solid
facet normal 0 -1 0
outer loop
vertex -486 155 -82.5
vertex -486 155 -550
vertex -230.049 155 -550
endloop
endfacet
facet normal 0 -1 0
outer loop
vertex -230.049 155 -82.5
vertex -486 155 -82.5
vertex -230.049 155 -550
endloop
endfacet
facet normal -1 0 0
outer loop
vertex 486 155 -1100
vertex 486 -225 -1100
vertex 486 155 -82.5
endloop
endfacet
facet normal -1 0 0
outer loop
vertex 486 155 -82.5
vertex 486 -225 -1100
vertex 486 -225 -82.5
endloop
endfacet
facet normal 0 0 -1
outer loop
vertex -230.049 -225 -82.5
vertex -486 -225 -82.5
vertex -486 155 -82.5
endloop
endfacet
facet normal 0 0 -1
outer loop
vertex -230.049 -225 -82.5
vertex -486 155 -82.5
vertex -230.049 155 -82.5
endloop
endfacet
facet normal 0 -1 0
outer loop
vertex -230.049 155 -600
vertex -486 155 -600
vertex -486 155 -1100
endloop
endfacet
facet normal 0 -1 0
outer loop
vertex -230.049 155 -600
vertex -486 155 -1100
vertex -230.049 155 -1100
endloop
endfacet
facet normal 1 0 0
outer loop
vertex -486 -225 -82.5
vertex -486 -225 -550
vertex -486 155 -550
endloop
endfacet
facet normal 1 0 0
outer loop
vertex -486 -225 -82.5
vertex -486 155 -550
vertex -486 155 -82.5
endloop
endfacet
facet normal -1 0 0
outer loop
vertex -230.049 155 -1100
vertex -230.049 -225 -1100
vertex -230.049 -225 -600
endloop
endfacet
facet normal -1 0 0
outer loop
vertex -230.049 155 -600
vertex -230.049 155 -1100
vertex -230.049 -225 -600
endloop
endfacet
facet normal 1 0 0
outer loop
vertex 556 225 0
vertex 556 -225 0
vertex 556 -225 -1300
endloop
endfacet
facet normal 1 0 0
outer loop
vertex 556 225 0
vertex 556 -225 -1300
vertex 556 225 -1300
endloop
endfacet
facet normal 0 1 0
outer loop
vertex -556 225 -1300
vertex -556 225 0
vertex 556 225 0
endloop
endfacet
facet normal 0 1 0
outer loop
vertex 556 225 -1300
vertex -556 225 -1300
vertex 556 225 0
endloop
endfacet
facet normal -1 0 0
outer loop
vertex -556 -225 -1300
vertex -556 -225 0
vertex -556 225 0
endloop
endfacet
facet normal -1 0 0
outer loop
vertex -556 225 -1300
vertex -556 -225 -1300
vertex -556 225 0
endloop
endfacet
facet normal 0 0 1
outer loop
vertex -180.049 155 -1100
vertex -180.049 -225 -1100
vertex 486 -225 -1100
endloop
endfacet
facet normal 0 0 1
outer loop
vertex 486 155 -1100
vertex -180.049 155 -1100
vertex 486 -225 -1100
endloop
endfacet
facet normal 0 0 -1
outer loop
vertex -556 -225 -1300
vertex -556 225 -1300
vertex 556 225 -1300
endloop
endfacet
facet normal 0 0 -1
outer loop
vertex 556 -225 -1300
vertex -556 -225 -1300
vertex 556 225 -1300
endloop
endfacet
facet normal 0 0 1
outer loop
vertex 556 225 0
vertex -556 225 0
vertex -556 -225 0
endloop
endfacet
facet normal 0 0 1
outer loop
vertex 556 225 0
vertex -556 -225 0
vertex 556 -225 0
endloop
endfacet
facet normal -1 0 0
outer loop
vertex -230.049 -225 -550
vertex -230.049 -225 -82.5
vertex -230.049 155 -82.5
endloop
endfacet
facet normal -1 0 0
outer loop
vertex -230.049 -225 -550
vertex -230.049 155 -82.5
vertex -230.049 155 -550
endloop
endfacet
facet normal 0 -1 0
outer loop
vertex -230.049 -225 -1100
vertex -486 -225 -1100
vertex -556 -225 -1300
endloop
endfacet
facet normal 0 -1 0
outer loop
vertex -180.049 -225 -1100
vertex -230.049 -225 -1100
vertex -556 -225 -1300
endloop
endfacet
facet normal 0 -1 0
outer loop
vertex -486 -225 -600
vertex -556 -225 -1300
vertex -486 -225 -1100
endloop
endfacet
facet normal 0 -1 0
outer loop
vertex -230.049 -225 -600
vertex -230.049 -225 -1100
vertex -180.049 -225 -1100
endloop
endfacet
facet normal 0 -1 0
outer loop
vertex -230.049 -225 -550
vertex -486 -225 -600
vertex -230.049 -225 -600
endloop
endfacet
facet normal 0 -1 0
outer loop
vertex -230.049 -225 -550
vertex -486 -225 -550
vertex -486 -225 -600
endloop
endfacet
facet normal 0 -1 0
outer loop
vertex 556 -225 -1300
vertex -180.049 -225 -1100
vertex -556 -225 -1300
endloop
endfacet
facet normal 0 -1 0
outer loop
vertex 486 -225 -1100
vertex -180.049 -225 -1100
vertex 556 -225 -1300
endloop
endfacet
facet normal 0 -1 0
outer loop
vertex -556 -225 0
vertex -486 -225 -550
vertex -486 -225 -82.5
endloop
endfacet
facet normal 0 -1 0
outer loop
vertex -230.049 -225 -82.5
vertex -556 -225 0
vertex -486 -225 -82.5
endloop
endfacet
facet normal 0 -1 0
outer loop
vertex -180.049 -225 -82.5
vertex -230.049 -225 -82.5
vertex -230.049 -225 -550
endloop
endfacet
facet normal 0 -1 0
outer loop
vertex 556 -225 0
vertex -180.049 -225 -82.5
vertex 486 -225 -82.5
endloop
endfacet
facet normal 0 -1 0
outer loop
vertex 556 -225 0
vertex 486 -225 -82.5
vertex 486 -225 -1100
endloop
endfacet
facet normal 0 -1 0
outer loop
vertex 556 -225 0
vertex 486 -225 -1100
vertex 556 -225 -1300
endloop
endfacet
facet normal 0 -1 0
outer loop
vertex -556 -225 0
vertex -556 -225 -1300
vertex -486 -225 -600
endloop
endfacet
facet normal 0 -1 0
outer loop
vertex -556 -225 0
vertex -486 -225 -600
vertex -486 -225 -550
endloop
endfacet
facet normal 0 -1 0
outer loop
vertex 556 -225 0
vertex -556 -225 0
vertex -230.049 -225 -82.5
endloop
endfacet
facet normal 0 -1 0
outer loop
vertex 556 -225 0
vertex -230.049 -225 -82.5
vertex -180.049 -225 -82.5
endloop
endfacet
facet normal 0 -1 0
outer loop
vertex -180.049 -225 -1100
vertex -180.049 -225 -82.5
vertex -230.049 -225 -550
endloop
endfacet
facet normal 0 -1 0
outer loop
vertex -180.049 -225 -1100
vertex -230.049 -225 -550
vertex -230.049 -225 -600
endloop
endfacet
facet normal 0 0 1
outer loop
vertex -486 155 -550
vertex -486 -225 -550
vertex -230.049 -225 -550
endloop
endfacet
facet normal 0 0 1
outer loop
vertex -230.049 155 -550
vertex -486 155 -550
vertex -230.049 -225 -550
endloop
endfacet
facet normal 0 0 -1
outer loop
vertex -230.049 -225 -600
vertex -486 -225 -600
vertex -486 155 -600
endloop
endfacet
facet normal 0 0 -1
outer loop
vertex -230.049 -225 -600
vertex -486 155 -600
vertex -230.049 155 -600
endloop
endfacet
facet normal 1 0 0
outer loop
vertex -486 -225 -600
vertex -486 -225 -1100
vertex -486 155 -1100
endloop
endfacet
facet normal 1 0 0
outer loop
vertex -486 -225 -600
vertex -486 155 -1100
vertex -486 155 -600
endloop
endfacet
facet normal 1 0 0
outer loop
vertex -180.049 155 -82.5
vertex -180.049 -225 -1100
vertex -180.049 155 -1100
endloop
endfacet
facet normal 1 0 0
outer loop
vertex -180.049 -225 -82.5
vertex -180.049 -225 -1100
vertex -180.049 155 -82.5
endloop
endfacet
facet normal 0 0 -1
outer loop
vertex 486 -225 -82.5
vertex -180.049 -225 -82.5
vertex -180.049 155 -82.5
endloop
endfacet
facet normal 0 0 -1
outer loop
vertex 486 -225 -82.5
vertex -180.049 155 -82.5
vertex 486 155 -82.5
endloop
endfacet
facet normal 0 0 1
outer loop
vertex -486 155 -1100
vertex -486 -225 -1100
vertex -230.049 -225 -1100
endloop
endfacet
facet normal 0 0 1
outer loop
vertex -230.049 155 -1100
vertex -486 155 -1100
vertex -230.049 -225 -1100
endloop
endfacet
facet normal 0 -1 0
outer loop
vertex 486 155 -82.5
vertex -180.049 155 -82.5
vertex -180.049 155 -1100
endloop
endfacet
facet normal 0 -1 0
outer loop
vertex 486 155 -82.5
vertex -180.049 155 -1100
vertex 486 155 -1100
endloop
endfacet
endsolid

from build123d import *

# Parameters (mm, degrees)
F0_W     = 1112
F0_H     = 450
F1_DEPTH = 1300
F2_W     = 972
F2_H     = 1017.5
F3_DEPTH = 380
F4_W     = 50
F4_H     = 467.5
F4_H_2   = 50
F4_W_2   = 255.950524
F4_H_3   = 500
F5_DEPTH = 380


with BuildPart() as f1:
    # F0 (on Top) → F1 (new body)
    with BuildSketch(Plane.XY):
        Rectangle(F0_W, F0_H)
    extrude(amount=-F1_DEPTH)

    # F2 (on face) → F3 (cut)
    with BuildSketch(Plane.XZ.offset(225)):
        with Locations((0, -591.25)):
            Rectangle(F2_W, F2_H)
    extrude(amount=-F3_DEPTH, mode=Mode.SUBTRACT)

    # F4 (on face) → F5 (join)
    with BuildSketch(Plane.XZ.offset(225)):
        with Locations((-205.049476, -316.25)):
            Rectangle(F4_W, F4_H)
        with Locations((-205.049476, -575)):
            Rectangle(F4_W, F4_H_2)
        with Locations((-358.024738, -575)):
            Rectangle(F4_W_2, F4_H_2)
        with Locations((-205.049476, -850)):
            Rectangle(F4_W, F4_H_3)
    extrude(amount=-F5_DEPTH)


solid = f1.part
